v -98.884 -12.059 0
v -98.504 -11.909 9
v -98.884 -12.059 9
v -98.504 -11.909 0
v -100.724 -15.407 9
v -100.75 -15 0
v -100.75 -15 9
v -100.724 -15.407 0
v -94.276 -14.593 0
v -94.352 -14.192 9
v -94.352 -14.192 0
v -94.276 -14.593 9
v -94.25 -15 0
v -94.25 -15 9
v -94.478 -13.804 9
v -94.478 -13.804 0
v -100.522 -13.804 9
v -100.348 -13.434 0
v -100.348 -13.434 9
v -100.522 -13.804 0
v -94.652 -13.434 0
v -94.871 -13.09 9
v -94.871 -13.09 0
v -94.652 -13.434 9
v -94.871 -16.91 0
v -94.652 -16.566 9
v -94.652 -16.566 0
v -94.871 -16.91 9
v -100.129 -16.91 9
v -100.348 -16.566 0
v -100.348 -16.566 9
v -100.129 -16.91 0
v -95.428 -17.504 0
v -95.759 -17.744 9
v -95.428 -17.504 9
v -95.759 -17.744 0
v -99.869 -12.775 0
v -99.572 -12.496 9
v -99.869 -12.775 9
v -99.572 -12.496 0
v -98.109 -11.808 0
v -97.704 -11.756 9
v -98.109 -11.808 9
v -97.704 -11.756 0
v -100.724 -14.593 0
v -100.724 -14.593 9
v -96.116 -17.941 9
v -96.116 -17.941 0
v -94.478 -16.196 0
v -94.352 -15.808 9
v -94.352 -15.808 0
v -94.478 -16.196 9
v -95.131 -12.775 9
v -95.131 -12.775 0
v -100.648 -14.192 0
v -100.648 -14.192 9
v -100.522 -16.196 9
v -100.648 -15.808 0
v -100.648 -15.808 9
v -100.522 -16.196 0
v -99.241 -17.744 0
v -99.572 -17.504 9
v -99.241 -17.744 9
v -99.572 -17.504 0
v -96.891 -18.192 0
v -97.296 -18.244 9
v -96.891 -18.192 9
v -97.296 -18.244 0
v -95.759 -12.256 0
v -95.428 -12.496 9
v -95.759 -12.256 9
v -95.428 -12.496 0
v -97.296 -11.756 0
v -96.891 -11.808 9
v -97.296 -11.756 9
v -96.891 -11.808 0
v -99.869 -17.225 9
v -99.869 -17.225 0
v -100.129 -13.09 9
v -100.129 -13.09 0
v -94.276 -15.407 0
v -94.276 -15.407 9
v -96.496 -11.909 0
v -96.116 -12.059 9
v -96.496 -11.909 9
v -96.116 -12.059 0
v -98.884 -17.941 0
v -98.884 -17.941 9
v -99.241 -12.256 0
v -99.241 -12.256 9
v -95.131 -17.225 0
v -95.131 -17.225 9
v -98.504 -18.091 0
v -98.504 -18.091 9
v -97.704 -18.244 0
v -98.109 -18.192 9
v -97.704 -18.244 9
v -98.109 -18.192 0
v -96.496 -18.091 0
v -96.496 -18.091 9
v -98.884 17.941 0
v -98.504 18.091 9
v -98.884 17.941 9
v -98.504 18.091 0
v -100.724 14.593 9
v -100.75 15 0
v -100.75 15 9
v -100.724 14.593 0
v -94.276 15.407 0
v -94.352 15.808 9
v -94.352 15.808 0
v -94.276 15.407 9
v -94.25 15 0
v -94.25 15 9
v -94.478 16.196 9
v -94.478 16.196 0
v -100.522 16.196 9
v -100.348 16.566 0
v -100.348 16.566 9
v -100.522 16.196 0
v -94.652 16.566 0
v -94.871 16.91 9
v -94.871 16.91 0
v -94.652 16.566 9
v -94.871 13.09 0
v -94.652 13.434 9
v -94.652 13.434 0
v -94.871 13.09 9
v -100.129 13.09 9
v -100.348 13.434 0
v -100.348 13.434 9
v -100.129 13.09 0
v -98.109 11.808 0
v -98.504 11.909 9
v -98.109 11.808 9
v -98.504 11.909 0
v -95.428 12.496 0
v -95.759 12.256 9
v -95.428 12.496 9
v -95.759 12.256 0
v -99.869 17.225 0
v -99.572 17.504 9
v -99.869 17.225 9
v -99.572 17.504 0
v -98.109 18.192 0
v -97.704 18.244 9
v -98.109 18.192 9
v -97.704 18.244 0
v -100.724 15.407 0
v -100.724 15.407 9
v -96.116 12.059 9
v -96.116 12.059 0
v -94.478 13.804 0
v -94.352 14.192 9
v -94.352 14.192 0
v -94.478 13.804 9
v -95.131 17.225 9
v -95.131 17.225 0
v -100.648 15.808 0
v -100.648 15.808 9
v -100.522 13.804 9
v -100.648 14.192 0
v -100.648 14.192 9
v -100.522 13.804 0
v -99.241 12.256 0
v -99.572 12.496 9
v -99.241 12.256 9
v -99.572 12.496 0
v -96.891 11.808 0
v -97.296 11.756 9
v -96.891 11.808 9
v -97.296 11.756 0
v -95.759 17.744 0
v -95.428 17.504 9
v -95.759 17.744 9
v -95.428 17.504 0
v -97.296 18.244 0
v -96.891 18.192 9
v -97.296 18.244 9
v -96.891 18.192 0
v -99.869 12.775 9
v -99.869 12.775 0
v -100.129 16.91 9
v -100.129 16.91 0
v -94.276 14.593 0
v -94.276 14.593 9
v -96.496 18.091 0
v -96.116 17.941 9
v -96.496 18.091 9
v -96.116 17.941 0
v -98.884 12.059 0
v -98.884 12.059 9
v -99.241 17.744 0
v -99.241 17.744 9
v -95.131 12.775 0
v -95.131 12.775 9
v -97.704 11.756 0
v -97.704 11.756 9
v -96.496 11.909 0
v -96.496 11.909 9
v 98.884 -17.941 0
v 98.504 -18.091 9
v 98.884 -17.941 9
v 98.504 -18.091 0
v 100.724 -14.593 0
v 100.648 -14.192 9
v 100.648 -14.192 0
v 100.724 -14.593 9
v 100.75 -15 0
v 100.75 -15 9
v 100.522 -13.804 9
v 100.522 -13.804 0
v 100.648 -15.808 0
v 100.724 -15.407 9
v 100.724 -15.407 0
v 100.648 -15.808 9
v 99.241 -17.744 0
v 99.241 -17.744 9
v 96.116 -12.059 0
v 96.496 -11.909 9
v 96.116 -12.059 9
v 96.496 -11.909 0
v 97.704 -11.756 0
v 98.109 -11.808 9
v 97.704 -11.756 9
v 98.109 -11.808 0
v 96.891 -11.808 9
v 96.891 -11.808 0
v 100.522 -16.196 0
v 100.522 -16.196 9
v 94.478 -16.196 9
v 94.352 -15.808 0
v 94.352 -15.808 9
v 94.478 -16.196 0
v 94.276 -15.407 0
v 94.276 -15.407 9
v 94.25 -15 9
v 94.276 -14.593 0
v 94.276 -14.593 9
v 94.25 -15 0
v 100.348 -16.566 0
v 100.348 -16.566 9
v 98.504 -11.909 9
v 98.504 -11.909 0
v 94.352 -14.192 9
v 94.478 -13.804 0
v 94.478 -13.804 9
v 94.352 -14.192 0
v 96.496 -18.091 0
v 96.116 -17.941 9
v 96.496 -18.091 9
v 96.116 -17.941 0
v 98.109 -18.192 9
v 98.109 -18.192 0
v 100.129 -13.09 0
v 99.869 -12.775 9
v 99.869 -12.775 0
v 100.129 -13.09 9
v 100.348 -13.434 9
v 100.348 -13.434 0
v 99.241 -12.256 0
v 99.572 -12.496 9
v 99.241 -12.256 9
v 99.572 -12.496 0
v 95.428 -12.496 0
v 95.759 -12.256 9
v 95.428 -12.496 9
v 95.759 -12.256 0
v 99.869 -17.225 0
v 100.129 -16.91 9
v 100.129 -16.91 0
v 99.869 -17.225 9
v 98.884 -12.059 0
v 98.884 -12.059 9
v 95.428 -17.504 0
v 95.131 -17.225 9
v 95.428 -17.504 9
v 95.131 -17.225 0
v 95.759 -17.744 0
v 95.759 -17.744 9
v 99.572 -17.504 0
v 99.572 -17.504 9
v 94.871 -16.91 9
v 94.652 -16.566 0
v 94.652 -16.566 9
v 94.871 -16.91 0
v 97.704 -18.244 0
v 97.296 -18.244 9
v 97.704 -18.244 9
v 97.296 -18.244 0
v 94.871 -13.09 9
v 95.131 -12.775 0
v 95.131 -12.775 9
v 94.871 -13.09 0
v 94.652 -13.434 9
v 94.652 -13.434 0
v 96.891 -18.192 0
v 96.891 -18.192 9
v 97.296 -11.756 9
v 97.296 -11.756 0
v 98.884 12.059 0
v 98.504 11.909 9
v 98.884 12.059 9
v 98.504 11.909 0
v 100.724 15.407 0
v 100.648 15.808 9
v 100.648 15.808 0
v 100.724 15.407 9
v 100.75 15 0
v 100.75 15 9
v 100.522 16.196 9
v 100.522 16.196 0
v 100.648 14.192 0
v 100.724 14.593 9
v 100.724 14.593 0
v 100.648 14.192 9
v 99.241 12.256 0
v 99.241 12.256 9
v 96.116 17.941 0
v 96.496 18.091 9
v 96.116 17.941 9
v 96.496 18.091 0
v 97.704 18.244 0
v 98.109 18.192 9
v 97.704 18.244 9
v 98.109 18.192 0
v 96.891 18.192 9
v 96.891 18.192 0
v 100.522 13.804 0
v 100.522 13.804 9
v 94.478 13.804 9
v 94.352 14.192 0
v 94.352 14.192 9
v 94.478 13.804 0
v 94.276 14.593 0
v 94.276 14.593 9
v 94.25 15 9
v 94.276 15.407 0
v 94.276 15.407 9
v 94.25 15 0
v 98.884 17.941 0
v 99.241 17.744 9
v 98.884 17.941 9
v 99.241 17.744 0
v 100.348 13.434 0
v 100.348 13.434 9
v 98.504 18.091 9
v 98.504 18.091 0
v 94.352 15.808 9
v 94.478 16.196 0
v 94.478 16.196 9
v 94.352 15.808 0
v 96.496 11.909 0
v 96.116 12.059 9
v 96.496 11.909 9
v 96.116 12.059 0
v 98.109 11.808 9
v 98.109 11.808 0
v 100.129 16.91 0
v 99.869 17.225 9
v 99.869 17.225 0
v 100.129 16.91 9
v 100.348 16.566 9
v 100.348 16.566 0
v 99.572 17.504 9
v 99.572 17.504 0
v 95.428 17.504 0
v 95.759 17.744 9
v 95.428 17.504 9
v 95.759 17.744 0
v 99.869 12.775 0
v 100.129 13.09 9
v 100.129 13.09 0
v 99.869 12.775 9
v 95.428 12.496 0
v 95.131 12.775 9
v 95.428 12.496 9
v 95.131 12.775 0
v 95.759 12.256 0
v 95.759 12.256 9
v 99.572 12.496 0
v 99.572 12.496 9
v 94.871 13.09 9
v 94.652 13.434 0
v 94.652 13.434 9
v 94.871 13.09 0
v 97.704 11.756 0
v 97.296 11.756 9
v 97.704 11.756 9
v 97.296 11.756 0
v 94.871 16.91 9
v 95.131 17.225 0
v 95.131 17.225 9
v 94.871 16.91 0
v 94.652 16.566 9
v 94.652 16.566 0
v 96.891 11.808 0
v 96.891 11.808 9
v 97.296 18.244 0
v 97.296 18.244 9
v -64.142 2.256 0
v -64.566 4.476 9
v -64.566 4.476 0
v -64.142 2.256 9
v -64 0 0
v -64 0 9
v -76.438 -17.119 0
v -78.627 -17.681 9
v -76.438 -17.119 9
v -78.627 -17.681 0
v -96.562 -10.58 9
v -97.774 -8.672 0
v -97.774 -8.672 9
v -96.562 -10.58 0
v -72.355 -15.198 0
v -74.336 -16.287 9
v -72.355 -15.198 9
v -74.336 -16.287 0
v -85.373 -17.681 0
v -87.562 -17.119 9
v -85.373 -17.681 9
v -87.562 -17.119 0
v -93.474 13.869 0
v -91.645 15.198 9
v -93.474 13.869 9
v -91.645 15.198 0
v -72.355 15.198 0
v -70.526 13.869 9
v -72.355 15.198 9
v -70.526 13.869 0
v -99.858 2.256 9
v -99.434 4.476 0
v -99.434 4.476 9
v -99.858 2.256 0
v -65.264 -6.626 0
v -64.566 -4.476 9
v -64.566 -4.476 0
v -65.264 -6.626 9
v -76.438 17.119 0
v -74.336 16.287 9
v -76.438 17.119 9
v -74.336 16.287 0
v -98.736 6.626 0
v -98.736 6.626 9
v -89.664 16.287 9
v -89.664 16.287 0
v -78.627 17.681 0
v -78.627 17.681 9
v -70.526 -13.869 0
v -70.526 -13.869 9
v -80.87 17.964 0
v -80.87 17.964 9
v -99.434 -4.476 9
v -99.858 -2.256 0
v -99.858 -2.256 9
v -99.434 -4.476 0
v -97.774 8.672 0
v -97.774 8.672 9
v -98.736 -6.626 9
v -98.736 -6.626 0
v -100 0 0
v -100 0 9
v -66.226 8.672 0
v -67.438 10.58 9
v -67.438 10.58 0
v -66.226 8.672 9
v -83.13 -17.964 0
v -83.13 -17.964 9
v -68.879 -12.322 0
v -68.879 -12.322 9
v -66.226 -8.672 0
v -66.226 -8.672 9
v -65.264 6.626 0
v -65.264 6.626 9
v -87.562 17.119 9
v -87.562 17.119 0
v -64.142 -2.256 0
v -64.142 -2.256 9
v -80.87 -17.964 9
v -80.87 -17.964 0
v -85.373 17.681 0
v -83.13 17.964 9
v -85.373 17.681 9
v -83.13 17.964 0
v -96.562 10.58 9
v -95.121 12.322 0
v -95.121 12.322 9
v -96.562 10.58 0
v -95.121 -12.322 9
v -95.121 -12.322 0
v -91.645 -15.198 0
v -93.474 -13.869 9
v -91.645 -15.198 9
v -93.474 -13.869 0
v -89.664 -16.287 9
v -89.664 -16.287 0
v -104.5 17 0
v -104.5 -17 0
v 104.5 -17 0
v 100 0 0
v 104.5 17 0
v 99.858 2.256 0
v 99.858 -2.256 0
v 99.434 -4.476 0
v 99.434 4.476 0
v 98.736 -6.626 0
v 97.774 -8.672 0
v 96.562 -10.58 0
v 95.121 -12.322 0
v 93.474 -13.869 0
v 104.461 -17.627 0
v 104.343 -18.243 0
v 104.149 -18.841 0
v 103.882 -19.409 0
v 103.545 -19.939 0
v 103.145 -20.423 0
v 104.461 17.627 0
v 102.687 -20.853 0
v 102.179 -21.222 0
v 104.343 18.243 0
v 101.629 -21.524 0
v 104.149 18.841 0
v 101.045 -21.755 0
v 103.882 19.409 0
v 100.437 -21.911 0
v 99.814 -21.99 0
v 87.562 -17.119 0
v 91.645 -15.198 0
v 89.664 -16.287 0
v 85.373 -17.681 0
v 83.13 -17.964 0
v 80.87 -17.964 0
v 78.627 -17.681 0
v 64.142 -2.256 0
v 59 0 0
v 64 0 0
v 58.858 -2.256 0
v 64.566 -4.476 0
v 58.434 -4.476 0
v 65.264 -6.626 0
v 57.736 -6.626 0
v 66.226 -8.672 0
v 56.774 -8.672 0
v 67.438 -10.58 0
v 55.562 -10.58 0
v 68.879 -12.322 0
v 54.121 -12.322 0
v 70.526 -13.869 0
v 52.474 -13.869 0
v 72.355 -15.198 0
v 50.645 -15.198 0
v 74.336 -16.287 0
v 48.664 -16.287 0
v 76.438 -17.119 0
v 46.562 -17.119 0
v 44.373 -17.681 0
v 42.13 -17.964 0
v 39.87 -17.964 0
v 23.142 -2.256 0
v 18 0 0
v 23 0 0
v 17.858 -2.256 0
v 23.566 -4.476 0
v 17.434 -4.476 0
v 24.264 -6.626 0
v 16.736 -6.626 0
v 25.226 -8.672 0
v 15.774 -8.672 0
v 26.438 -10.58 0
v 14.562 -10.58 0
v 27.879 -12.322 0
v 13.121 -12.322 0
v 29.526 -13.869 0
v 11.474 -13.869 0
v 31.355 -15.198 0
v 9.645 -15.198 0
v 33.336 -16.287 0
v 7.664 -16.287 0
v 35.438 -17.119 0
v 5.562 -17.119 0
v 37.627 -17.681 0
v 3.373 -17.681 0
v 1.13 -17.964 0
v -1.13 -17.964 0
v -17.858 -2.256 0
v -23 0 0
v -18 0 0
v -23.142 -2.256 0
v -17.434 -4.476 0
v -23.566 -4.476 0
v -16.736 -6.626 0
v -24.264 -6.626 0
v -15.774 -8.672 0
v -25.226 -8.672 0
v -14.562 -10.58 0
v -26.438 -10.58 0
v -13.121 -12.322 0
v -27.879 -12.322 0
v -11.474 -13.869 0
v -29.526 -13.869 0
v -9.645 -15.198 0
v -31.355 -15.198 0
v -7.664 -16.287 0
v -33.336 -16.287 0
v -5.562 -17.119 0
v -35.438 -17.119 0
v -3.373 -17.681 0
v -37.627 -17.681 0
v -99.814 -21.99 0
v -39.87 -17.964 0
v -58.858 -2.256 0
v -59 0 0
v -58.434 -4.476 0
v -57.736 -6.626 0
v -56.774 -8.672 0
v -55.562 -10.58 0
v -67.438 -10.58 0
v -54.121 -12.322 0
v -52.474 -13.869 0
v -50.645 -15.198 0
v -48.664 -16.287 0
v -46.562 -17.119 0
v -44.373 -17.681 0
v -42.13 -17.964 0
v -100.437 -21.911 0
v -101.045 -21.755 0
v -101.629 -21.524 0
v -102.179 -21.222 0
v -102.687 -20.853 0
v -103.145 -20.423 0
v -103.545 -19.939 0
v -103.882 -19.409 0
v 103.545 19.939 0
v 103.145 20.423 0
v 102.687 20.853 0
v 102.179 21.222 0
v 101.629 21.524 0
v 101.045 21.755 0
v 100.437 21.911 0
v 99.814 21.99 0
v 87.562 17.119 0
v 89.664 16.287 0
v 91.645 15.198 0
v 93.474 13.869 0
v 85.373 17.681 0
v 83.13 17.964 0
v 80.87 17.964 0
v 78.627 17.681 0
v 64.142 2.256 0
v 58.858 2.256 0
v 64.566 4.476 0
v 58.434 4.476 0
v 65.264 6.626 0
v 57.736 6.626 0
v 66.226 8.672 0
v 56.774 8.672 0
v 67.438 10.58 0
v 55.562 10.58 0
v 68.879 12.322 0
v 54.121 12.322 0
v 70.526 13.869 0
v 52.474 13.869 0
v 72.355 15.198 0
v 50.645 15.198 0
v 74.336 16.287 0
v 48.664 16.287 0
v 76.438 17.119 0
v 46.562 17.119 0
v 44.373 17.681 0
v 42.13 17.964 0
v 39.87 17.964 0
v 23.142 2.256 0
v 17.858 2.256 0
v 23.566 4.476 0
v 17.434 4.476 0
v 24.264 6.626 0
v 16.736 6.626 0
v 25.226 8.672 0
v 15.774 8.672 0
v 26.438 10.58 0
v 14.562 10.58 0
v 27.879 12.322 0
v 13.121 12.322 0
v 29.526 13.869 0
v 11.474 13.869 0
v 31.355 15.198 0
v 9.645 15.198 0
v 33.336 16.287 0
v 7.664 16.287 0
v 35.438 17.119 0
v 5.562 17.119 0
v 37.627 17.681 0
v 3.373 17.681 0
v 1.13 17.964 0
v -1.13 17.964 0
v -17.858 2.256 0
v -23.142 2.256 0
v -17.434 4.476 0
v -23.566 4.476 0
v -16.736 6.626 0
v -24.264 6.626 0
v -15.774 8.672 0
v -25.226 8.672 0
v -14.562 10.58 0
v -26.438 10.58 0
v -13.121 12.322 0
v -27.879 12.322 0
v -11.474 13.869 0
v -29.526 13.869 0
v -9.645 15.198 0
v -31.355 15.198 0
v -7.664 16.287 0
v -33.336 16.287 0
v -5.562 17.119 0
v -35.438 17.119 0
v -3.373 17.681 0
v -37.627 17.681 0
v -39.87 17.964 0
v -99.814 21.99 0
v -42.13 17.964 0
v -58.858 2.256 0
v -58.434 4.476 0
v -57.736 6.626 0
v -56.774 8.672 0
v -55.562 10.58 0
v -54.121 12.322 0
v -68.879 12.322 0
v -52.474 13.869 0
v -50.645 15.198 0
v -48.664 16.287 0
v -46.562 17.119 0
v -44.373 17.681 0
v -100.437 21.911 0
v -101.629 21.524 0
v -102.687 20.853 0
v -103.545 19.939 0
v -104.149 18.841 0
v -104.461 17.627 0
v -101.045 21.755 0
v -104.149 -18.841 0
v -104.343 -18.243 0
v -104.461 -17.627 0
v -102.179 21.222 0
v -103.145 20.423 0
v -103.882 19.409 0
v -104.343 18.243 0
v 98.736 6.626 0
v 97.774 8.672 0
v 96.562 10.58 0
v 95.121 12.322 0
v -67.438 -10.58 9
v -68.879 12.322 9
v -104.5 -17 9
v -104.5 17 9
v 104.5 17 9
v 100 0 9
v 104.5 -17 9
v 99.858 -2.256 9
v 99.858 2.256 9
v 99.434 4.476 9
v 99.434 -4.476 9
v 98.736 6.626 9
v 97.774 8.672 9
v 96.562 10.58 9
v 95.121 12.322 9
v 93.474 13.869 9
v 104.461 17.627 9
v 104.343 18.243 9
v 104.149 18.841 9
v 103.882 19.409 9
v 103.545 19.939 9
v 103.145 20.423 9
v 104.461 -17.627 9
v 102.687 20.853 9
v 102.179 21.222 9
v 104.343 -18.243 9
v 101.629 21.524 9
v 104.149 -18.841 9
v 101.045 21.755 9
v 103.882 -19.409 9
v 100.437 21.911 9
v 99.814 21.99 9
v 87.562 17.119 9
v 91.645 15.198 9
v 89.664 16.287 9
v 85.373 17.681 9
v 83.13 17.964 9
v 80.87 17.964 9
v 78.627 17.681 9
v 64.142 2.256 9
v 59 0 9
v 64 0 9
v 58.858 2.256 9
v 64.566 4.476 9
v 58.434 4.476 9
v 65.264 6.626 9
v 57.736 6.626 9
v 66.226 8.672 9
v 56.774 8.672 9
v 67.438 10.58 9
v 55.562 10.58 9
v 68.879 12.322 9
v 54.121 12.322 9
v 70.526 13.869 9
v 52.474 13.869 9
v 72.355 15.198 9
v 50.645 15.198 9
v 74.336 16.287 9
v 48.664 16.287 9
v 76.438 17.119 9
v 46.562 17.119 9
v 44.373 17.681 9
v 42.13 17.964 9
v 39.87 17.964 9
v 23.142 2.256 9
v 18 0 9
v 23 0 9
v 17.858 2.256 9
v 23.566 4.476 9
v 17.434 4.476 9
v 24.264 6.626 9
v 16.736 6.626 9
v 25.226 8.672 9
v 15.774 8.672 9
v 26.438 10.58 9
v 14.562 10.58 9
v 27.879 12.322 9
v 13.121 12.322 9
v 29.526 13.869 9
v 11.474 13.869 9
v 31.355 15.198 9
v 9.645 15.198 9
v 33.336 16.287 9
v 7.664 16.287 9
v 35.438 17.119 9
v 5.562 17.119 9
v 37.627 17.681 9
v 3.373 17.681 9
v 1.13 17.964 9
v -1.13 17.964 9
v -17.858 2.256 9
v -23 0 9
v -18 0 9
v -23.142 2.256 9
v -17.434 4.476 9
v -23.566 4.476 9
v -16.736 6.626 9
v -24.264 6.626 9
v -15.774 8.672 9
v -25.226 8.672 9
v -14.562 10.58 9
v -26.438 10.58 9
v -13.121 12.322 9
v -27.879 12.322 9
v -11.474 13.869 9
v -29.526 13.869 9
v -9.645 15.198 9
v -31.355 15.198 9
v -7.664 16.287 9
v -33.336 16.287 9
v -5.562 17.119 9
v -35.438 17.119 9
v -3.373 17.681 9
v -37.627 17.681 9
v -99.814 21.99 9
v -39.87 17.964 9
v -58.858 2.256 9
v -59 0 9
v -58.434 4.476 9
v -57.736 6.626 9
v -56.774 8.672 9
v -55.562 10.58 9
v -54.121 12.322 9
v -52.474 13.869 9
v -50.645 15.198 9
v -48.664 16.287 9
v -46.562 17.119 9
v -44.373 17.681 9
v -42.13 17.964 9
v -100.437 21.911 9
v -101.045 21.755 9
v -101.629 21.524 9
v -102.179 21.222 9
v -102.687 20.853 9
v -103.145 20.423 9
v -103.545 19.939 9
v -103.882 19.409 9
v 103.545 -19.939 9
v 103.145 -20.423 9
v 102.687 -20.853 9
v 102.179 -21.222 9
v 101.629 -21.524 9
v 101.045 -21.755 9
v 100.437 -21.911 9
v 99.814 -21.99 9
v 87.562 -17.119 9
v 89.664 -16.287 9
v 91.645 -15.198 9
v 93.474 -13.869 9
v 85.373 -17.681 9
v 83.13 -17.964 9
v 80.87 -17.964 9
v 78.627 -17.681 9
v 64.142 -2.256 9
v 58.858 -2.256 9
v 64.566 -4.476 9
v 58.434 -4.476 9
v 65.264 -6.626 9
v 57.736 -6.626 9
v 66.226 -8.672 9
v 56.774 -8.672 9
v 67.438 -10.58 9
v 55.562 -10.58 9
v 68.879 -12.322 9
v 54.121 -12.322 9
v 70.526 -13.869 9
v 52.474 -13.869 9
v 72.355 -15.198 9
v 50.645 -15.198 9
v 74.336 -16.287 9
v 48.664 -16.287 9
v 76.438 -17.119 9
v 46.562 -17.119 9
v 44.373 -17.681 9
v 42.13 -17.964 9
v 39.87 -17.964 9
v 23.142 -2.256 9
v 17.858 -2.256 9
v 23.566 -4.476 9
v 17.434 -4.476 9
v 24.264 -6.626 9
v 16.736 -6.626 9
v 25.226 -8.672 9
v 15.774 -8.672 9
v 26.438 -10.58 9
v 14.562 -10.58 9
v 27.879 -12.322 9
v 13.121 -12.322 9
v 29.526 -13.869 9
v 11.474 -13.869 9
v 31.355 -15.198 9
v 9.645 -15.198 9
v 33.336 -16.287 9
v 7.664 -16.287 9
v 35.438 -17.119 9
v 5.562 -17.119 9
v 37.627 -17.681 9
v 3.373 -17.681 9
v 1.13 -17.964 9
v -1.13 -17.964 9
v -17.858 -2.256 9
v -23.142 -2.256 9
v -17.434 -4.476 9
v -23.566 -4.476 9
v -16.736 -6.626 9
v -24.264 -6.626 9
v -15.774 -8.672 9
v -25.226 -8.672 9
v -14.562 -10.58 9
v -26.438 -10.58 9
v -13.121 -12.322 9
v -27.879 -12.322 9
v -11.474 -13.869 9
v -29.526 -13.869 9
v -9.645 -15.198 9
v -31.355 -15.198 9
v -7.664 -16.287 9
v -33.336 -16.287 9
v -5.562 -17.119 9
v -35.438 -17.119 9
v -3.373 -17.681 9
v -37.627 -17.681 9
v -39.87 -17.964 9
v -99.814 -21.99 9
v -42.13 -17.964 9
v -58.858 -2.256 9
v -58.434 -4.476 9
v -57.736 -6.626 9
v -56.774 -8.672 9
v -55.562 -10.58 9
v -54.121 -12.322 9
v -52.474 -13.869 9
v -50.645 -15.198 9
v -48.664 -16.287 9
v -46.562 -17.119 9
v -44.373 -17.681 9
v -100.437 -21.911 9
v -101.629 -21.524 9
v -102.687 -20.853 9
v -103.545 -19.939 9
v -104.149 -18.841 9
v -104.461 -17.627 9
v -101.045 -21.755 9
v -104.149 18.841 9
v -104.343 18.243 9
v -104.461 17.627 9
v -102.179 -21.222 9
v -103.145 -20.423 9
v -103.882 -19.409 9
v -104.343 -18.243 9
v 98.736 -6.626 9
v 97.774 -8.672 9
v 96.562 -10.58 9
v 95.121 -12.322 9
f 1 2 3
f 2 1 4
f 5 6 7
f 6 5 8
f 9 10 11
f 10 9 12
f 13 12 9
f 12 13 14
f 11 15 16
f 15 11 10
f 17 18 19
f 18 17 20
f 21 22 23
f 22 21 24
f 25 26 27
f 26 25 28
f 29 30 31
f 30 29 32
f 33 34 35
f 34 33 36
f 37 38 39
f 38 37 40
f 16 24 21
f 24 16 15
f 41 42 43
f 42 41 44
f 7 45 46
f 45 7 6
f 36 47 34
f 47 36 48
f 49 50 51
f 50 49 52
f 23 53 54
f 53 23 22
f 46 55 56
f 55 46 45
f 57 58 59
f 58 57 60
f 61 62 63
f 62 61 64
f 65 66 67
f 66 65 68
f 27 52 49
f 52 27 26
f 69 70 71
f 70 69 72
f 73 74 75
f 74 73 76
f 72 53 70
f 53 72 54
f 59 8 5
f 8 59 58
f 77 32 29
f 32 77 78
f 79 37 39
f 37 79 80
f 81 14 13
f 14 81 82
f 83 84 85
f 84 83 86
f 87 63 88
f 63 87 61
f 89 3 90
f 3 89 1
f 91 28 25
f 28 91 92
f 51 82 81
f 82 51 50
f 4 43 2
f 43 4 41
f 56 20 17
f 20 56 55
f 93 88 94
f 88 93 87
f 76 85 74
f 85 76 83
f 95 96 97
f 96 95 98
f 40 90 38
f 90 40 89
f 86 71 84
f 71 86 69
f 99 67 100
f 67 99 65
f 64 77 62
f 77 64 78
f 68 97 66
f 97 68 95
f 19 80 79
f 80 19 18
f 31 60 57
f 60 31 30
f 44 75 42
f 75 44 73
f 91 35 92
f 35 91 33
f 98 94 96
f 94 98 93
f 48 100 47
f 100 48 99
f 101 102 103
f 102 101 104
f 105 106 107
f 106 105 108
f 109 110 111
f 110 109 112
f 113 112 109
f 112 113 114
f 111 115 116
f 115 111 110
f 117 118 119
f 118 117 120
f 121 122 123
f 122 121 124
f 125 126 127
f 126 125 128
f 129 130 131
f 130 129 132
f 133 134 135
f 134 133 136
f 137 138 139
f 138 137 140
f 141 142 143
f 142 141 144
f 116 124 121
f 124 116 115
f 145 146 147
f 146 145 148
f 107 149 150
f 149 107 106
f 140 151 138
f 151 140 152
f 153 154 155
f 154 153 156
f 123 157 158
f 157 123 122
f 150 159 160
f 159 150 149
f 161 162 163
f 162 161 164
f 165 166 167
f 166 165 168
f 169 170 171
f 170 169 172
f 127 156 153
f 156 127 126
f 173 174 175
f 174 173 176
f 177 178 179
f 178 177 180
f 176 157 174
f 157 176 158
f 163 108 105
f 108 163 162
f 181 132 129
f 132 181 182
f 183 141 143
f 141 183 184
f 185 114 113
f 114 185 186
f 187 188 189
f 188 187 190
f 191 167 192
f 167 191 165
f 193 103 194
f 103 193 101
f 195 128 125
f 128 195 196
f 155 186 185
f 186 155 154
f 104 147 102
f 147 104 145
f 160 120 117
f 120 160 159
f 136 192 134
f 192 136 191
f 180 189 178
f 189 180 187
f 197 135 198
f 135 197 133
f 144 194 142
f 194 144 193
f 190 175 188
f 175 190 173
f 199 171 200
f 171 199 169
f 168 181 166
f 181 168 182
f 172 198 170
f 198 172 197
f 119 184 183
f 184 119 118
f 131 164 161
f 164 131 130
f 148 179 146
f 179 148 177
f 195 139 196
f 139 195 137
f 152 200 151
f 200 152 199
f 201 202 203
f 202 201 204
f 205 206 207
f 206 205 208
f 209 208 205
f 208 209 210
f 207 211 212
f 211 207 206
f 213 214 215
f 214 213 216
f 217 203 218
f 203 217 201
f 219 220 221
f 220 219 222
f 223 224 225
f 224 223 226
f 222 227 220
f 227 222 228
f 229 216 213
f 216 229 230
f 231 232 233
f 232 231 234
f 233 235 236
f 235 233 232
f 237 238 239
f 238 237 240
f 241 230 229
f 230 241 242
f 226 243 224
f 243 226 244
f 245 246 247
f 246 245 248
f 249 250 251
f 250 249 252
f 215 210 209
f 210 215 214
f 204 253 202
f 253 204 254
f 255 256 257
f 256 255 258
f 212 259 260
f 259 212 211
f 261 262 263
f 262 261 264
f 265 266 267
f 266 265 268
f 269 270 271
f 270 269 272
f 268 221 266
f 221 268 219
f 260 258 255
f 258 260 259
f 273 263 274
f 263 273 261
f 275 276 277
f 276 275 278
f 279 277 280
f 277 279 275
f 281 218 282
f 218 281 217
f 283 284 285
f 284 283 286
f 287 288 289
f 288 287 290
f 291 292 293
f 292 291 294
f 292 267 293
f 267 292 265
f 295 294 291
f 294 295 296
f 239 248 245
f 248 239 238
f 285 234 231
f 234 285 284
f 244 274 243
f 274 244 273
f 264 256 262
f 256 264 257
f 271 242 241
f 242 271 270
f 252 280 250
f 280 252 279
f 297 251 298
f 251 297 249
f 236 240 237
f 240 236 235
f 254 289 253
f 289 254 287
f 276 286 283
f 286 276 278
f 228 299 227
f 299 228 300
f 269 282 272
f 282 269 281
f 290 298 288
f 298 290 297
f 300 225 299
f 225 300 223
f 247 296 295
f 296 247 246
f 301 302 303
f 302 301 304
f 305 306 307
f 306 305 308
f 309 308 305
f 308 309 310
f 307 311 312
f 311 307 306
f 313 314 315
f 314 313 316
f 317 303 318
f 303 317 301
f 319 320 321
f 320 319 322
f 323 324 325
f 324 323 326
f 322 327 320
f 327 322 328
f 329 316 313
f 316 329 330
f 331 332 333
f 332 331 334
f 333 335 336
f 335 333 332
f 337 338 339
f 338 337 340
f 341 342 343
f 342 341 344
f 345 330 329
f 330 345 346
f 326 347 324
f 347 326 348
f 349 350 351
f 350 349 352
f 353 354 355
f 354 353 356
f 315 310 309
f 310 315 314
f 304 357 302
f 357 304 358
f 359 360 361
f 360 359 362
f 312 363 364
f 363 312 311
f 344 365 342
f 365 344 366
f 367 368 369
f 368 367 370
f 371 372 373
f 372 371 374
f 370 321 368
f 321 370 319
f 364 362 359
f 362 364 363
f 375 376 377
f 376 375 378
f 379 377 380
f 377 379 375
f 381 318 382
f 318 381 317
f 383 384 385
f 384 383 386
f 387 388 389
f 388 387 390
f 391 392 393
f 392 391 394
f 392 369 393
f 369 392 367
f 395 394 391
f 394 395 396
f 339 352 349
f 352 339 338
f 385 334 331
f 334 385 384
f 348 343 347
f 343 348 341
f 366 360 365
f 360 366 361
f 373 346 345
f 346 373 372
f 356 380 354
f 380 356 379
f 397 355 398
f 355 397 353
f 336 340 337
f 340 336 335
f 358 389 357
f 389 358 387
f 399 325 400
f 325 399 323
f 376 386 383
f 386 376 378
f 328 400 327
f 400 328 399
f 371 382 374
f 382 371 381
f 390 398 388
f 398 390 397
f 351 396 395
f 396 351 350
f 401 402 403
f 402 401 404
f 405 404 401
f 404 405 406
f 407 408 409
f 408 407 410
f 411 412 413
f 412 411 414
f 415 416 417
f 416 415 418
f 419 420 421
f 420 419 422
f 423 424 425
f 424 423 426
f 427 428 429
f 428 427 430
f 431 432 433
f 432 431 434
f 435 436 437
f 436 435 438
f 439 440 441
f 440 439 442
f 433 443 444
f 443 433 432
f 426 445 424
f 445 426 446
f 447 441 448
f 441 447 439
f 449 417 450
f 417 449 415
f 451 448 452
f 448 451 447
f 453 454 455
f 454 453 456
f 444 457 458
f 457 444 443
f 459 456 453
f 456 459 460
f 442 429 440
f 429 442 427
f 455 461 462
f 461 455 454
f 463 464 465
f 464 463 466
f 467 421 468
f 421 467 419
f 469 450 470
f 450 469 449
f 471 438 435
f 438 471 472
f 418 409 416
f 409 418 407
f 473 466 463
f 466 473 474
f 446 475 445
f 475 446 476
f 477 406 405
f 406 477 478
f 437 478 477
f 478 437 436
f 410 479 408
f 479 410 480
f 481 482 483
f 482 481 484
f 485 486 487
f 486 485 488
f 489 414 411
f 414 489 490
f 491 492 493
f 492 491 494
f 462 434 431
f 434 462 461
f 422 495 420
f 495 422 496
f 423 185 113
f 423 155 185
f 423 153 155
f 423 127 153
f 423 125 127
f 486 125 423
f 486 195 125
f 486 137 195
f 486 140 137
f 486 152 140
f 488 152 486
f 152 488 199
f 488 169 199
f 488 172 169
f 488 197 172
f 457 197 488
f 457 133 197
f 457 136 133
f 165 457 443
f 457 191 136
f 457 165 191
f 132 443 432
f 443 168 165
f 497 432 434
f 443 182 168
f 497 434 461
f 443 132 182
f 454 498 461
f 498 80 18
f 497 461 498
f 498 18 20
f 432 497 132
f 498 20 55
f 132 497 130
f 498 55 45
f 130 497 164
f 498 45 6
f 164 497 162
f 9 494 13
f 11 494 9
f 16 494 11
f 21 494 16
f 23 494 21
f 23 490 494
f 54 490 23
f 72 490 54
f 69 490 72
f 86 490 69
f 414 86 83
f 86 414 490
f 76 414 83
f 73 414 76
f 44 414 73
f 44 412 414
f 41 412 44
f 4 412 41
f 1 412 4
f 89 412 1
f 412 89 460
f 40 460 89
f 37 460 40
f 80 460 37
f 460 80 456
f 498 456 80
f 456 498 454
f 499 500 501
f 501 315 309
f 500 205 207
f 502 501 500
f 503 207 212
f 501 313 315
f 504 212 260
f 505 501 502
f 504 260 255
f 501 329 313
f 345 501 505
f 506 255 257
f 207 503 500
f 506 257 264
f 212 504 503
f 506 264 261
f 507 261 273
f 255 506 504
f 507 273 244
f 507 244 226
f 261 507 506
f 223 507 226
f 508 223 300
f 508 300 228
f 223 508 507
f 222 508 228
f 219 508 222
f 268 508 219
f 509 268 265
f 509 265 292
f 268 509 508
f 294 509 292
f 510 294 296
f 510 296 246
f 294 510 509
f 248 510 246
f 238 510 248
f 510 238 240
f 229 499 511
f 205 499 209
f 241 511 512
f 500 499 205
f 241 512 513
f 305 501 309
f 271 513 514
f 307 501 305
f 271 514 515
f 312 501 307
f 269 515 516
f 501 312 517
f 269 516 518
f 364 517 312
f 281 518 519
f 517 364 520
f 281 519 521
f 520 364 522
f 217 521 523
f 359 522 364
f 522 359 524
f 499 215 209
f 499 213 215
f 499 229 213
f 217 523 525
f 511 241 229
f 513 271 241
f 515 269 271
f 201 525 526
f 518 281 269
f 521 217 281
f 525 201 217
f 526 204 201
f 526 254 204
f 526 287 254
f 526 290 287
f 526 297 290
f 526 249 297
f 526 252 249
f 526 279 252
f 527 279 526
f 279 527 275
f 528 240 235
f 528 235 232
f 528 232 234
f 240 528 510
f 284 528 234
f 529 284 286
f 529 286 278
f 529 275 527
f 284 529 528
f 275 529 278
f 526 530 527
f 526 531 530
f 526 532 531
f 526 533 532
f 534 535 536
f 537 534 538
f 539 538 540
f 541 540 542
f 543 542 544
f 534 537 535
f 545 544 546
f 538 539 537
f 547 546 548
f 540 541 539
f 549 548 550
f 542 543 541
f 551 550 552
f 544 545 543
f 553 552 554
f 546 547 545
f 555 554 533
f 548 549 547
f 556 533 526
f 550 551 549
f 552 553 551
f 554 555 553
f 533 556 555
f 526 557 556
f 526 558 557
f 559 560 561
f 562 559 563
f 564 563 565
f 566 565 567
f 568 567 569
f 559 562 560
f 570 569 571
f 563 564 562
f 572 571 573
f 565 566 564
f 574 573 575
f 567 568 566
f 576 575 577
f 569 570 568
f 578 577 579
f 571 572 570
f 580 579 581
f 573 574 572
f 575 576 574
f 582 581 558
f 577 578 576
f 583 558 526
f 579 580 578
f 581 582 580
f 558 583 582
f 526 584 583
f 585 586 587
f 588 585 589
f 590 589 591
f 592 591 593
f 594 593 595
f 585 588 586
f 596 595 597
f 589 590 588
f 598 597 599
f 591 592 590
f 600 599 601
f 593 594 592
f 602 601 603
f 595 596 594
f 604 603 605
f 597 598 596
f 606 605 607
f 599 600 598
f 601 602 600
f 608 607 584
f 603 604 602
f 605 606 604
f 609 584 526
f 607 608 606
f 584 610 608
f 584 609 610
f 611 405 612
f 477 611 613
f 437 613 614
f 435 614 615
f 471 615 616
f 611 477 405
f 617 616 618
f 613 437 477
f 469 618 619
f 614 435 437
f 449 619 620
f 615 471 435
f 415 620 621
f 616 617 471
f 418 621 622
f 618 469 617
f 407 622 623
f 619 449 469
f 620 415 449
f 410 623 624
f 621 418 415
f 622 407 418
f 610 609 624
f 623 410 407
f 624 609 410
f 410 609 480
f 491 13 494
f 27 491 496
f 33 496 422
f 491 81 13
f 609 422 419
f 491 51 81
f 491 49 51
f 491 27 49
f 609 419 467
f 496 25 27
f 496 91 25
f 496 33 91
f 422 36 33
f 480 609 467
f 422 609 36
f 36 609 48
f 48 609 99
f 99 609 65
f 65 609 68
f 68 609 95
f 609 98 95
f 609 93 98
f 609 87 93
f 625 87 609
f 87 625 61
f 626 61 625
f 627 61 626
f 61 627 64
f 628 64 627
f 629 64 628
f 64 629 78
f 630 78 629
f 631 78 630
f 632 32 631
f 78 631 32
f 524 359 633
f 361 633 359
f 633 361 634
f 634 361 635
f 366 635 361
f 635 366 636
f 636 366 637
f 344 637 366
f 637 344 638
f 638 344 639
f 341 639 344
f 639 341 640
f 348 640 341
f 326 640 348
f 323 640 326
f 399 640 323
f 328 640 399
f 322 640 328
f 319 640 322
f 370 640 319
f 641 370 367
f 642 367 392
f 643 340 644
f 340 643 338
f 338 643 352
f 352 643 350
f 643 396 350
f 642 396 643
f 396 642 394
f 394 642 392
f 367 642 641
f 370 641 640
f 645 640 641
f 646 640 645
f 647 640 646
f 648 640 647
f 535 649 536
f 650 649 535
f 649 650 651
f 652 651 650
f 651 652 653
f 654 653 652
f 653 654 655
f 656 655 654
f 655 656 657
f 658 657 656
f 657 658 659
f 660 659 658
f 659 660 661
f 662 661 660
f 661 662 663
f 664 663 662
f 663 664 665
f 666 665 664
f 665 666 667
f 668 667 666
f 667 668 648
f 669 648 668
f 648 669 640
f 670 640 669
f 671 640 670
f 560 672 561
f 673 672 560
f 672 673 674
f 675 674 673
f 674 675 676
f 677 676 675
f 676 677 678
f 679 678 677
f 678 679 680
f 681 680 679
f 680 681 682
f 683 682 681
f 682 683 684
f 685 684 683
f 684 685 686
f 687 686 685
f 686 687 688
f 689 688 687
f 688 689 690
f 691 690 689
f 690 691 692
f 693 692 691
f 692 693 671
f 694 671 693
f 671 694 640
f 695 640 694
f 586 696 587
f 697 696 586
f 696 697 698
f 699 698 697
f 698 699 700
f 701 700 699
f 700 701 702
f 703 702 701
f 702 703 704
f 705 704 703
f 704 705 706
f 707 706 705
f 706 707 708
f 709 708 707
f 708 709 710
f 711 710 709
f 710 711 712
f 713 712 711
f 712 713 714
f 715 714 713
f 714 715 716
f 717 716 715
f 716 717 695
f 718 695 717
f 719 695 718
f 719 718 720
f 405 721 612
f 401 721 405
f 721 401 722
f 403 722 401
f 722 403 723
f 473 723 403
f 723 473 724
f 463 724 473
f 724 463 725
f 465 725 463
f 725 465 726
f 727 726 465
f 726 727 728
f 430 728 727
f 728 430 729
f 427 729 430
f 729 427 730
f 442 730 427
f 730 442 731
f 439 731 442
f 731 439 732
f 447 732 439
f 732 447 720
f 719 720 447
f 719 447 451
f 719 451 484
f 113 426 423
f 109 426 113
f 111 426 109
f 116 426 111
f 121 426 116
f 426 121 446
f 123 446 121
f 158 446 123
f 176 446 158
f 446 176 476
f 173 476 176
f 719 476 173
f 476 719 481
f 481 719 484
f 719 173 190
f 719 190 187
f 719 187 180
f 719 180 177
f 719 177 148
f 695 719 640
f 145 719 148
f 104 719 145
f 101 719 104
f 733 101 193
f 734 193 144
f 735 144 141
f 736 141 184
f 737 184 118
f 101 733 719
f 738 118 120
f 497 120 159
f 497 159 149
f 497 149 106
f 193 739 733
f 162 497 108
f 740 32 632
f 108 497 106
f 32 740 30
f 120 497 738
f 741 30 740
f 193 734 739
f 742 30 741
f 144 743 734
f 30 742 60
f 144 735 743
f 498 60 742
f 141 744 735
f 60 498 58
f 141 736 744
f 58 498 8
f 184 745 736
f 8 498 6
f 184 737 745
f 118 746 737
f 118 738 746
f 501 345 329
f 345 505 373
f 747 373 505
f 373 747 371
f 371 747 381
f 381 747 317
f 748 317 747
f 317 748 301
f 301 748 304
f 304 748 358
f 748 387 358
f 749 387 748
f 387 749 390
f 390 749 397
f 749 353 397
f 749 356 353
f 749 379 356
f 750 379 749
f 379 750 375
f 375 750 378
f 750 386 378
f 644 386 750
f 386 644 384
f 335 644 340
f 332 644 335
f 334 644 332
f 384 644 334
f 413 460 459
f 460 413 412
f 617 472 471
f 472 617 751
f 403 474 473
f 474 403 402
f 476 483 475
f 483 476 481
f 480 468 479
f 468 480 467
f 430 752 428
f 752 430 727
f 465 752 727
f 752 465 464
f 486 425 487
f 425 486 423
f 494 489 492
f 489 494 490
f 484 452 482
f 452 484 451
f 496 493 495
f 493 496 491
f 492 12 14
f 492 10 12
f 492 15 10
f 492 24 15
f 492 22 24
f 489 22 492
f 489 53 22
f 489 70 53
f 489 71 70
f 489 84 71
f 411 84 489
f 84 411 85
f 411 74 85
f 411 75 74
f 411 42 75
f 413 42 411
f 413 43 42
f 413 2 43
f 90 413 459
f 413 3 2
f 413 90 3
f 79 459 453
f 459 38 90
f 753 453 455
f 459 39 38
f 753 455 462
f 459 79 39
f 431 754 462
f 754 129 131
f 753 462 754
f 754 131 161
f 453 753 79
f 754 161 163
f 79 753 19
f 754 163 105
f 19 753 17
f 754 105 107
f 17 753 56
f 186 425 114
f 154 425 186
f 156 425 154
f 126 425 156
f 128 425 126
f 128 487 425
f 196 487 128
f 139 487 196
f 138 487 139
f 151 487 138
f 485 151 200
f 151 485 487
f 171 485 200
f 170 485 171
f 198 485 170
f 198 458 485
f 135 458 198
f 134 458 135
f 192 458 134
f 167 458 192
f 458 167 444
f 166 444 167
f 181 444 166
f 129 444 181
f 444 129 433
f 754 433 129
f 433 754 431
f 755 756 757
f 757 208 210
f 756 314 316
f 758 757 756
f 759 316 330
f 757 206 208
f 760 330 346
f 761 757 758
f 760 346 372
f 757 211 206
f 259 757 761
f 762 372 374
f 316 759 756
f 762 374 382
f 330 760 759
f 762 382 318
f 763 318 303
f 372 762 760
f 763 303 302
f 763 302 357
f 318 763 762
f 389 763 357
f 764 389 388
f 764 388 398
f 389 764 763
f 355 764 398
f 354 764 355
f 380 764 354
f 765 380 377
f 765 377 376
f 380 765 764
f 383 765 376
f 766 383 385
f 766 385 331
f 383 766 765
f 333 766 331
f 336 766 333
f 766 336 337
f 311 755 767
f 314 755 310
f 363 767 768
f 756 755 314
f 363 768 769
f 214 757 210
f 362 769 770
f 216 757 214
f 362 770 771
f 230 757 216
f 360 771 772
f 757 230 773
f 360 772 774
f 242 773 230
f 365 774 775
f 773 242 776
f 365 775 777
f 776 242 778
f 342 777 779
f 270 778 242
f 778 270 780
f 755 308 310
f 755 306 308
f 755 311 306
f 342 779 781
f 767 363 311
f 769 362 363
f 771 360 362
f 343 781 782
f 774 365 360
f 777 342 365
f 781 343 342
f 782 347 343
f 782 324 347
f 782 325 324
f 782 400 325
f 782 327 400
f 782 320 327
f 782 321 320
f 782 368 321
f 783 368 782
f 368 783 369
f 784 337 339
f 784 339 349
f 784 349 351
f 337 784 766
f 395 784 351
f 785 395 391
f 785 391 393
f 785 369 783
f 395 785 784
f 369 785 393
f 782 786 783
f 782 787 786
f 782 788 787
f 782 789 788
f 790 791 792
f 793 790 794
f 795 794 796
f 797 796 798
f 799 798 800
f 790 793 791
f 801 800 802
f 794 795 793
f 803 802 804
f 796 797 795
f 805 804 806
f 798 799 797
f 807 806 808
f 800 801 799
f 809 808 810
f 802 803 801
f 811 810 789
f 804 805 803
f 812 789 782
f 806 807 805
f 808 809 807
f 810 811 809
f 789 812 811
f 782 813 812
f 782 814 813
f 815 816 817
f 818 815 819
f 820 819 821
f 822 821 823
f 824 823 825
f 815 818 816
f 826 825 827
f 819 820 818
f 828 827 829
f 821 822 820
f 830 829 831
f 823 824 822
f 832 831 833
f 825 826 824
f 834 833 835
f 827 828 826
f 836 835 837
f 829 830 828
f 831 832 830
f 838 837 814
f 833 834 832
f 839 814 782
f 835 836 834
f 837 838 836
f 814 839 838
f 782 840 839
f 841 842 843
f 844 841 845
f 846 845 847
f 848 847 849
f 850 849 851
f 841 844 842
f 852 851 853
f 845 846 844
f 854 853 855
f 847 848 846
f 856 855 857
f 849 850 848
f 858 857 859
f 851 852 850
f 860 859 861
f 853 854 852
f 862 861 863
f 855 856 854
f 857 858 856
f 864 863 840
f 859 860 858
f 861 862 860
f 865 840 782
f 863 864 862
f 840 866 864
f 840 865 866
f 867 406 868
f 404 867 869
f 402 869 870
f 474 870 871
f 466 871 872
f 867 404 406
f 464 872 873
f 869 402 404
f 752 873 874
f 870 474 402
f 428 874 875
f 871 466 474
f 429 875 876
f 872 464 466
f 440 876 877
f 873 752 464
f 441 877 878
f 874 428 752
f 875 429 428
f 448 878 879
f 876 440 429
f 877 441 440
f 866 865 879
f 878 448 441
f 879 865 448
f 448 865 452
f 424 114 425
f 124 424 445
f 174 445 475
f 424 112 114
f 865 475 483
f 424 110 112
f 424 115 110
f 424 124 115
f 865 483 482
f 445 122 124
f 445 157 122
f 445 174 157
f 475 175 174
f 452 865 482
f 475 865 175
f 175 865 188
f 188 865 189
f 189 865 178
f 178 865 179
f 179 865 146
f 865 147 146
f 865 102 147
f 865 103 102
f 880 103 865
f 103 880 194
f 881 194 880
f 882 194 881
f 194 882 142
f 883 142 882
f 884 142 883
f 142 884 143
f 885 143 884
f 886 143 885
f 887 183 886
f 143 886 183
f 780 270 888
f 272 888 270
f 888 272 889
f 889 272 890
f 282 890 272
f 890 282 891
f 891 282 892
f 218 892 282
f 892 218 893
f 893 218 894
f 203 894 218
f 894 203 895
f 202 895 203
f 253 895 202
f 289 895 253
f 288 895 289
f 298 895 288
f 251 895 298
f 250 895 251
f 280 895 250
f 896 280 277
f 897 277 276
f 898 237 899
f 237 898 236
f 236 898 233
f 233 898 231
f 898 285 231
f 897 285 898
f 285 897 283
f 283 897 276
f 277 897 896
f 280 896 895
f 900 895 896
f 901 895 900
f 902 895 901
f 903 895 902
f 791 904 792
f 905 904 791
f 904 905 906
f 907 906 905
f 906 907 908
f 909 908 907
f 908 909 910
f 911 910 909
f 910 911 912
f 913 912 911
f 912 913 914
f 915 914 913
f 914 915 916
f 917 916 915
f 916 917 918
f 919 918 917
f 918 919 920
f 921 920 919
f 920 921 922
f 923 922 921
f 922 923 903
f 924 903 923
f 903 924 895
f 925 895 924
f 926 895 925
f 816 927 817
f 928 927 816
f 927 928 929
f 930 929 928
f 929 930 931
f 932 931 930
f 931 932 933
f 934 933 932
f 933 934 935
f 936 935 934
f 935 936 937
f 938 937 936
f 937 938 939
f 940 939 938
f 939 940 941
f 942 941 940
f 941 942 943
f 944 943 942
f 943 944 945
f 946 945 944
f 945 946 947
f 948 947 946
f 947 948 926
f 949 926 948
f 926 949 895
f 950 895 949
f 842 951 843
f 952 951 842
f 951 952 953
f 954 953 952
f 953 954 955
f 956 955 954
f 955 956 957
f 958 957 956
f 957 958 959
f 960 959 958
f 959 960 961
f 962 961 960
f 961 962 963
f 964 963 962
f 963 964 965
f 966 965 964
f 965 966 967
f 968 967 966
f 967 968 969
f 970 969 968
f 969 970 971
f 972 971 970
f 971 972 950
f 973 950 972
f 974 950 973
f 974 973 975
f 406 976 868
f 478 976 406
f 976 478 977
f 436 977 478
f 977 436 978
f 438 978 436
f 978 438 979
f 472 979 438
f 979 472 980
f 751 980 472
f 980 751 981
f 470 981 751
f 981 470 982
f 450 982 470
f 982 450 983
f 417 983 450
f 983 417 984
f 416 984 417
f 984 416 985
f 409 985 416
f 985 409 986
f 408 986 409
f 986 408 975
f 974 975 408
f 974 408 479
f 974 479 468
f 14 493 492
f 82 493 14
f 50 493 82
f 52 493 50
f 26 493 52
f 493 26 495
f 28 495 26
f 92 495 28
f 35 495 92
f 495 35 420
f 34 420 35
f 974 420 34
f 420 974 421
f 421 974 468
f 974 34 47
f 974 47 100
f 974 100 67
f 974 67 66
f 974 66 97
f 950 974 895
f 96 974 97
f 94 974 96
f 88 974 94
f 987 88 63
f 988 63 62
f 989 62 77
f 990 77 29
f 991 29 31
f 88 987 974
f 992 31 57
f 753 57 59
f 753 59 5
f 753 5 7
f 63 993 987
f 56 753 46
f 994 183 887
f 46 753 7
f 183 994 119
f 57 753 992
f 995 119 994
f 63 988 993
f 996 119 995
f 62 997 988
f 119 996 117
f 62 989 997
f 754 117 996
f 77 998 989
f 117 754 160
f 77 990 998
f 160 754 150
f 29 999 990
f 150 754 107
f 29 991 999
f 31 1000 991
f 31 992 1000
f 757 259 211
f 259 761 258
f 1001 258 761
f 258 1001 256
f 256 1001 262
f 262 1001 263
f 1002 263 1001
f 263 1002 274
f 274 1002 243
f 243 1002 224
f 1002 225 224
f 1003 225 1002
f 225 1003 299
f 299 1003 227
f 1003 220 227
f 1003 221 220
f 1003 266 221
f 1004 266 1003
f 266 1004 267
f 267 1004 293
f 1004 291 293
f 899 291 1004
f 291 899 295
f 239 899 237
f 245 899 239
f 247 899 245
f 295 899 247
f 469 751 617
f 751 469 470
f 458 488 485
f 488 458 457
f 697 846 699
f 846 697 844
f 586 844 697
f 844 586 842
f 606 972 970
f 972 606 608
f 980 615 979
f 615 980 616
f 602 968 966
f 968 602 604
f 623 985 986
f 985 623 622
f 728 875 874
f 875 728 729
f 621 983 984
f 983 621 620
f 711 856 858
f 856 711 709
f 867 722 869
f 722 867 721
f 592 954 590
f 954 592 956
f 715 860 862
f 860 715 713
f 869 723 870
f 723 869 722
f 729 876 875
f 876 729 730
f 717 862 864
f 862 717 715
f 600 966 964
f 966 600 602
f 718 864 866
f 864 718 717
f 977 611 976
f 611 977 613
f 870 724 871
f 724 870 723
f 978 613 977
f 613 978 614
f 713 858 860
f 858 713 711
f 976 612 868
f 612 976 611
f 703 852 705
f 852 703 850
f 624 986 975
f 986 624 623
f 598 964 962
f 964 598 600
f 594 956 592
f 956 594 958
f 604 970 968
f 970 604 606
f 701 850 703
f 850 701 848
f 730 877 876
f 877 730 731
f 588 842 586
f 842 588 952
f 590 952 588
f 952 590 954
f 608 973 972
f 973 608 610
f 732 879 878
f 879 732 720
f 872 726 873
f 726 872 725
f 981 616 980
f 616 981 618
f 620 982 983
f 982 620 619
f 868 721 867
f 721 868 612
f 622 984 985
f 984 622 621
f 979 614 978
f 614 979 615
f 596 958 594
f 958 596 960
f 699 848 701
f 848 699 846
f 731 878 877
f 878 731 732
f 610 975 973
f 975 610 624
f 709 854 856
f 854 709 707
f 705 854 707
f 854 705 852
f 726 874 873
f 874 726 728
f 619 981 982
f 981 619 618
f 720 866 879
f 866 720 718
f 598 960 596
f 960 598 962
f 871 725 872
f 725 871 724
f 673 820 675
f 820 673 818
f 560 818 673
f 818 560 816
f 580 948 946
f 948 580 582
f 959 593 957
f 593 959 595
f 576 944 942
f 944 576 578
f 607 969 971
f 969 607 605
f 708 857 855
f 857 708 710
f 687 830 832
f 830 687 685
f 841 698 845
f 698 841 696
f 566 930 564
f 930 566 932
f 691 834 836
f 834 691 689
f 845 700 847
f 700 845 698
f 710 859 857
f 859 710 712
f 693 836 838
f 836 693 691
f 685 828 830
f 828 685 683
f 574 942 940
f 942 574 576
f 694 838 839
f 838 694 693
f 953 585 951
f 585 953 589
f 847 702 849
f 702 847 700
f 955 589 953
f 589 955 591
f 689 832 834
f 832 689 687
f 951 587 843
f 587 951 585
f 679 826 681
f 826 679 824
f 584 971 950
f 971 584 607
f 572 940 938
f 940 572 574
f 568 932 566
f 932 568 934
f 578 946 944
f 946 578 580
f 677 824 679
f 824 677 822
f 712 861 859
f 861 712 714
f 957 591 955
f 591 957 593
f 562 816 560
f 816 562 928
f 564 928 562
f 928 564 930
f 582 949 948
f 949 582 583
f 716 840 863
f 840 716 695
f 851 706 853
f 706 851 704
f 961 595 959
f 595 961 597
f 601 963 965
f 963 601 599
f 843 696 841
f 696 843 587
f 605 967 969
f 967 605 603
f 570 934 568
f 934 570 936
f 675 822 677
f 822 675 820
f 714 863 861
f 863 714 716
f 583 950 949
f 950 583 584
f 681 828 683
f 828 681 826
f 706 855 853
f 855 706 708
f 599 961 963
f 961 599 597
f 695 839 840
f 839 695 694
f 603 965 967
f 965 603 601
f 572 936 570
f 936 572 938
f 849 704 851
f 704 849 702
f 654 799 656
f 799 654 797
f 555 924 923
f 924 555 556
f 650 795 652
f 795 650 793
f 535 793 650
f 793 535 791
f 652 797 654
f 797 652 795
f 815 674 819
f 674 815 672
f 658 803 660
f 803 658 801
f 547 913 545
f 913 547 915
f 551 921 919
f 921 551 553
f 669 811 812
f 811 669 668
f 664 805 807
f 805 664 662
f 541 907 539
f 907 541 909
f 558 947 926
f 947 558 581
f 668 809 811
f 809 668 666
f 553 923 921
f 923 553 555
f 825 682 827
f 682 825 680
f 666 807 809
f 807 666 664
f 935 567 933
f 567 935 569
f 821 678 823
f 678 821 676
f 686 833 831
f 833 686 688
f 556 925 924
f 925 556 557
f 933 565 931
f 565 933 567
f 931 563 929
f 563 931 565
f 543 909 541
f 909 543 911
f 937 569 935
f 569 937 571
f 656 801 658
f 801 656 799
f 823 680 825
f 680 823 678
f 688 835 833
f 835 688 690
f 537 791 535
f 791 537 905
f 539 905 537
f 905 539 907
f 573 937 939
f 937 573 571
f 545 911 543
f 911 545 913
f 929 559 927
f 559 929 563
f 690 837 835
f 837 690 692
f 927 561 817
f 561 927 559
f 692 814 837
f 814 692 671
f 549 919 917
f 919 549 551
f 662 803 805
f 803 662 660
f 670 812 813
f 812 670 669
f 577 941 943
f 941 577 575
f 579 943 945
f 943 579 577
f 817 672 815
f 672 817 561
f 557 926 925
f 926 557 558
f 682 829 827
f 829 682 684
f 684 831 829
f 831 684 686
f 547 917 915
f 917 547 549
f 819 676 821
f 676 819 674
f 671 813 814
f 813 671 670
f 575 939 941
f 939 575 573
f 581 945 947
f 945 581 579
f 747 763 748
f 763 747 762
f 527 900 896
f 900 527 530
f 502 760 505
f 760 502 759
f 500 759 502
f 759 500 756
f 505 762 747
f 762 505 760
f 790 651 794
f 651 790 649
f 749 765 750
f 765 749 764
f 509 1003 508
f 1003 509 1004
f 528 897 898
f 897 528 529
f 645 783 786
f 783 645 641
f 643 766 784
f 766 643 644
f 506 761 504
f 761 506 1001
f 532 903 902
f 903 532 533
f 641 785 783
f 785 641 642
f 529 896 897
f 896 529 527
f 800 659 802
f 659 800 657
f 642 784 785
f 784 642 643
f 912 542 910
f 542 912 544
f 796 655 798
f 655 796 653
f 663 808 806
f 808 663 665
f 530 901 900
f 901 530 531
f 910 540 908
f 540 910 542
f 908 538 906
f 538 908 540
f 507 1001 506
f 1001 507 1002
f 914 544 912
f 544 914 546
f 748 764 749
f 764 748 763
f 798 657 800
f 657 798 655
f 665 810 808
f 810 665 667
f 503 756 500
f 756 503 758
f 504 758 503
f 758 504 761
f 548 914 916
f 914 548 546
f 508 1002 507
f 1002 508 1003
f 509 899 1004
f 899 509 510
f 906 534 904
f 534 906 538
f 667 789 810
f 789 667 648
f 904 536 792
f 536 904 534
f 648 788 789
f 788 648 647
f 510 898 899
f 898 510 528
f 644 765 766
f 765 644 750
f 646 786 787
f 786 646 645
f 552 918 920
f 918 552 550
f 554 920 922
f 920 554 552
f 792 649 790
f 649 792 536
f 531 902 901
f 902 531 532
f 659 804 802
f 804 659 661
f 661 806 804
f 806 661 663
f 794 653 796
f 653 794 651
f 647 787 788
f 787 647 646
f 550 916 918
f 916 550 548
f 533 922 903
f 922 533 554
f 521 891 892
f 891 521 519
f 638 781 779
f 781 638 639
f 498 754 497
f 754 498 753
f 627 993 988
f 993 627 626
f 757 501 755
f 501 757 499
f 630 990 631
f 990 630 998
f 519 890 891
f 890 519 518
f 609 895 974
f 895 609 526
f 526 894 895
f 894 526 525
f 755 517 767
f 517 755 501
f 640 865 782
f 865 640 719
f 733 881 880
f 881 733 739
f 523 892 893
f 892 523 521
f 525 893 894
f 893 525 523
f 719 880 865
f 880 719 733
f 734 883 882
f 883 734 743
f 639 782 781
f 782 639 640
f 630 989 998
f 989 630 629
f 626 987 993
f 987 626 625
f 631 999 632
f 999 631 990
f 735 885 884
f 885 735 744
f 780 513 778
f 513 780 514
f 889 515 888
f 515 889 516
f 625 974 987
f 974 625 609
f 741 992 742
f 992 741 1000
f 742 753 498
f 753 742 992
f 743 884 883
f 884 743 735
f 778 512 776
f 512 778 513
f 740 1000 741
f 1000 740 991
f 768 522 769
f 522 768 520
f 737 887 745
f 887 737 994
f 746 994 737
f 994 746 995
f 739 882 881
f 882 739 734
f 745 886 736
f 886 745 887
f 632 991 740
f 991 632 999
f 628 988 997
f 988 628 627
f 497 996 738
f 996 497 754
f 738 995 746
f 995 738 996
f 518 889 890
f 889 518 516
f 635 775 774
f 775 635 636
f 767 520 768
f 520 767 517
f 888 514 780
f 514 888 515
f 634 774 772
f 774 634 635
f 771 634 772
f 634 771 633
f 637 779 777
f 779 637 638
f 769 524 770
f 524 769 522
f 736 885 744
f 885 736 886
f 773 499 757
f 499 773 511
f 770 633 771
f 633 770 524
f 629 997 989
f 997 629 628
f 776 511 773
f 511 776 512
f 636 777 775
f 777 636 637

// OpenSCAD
$fn = 50;


difference() {
	union() {
		hull() {
			translate(v = [-99.5000000000, 17.0000000000, 0]) {
				cylinder(h = 9, r = 5);
			}
			translate(v = [99.5000000000, 17.0000000000, 0]) {
				cylinder(h = 9, r = 5);
			}
			translate(v = [-99.5000000000, -17.0000000000, 0]) {
				cylinder(h = 9, r = 5);
			}
			translate(v = [99.5000000000, -17.0000000000, 0]) {
				cylinder(h = 9, r = 5);
			}
		}
	}
	union() {
		#translate(v = [-97.5000000000, -15.0000000000, -100.0000000000]) {
			cylinder(h = 200, r = 3.2500000000);
		}
		#translate(v = [-97.5000000000, 15.0000000000, -100.0000000000]) {
			cylinder(h = 200, r = 3.2500000000);
		}
		#translate(v = [97.5000000000, -15.0000000000, -100.0000000000]) {
			cylinder(h = 200, r = 3.2500000000);
		}
		#translate(v = [97.5000000000, 15.0000000000, -100.0000000000]) {
			cylinder(h = 200, r = 3.2500000000);
		}
		#translate(v = [-82.0000000000, 0, 0]) {
			cylinder(h = 9, r = 18.0000000000);
		}
		#translate(v = [-41.0000000000, 0, 0]) {
			cylinder(h = 9, r = 18.0000000000);
		}
		#cylinder(h = 9, r = 18.0000000000);
		#translate(v = [41.0000000000, 0, 0]) {
			cylinder(h = 9, r = 18.0000000000);
		}
		#translate(v = [82.0000000000, 0, 0]) {
			cylinder(h = 9, r = 18.0000000000);
		}
	}
}
